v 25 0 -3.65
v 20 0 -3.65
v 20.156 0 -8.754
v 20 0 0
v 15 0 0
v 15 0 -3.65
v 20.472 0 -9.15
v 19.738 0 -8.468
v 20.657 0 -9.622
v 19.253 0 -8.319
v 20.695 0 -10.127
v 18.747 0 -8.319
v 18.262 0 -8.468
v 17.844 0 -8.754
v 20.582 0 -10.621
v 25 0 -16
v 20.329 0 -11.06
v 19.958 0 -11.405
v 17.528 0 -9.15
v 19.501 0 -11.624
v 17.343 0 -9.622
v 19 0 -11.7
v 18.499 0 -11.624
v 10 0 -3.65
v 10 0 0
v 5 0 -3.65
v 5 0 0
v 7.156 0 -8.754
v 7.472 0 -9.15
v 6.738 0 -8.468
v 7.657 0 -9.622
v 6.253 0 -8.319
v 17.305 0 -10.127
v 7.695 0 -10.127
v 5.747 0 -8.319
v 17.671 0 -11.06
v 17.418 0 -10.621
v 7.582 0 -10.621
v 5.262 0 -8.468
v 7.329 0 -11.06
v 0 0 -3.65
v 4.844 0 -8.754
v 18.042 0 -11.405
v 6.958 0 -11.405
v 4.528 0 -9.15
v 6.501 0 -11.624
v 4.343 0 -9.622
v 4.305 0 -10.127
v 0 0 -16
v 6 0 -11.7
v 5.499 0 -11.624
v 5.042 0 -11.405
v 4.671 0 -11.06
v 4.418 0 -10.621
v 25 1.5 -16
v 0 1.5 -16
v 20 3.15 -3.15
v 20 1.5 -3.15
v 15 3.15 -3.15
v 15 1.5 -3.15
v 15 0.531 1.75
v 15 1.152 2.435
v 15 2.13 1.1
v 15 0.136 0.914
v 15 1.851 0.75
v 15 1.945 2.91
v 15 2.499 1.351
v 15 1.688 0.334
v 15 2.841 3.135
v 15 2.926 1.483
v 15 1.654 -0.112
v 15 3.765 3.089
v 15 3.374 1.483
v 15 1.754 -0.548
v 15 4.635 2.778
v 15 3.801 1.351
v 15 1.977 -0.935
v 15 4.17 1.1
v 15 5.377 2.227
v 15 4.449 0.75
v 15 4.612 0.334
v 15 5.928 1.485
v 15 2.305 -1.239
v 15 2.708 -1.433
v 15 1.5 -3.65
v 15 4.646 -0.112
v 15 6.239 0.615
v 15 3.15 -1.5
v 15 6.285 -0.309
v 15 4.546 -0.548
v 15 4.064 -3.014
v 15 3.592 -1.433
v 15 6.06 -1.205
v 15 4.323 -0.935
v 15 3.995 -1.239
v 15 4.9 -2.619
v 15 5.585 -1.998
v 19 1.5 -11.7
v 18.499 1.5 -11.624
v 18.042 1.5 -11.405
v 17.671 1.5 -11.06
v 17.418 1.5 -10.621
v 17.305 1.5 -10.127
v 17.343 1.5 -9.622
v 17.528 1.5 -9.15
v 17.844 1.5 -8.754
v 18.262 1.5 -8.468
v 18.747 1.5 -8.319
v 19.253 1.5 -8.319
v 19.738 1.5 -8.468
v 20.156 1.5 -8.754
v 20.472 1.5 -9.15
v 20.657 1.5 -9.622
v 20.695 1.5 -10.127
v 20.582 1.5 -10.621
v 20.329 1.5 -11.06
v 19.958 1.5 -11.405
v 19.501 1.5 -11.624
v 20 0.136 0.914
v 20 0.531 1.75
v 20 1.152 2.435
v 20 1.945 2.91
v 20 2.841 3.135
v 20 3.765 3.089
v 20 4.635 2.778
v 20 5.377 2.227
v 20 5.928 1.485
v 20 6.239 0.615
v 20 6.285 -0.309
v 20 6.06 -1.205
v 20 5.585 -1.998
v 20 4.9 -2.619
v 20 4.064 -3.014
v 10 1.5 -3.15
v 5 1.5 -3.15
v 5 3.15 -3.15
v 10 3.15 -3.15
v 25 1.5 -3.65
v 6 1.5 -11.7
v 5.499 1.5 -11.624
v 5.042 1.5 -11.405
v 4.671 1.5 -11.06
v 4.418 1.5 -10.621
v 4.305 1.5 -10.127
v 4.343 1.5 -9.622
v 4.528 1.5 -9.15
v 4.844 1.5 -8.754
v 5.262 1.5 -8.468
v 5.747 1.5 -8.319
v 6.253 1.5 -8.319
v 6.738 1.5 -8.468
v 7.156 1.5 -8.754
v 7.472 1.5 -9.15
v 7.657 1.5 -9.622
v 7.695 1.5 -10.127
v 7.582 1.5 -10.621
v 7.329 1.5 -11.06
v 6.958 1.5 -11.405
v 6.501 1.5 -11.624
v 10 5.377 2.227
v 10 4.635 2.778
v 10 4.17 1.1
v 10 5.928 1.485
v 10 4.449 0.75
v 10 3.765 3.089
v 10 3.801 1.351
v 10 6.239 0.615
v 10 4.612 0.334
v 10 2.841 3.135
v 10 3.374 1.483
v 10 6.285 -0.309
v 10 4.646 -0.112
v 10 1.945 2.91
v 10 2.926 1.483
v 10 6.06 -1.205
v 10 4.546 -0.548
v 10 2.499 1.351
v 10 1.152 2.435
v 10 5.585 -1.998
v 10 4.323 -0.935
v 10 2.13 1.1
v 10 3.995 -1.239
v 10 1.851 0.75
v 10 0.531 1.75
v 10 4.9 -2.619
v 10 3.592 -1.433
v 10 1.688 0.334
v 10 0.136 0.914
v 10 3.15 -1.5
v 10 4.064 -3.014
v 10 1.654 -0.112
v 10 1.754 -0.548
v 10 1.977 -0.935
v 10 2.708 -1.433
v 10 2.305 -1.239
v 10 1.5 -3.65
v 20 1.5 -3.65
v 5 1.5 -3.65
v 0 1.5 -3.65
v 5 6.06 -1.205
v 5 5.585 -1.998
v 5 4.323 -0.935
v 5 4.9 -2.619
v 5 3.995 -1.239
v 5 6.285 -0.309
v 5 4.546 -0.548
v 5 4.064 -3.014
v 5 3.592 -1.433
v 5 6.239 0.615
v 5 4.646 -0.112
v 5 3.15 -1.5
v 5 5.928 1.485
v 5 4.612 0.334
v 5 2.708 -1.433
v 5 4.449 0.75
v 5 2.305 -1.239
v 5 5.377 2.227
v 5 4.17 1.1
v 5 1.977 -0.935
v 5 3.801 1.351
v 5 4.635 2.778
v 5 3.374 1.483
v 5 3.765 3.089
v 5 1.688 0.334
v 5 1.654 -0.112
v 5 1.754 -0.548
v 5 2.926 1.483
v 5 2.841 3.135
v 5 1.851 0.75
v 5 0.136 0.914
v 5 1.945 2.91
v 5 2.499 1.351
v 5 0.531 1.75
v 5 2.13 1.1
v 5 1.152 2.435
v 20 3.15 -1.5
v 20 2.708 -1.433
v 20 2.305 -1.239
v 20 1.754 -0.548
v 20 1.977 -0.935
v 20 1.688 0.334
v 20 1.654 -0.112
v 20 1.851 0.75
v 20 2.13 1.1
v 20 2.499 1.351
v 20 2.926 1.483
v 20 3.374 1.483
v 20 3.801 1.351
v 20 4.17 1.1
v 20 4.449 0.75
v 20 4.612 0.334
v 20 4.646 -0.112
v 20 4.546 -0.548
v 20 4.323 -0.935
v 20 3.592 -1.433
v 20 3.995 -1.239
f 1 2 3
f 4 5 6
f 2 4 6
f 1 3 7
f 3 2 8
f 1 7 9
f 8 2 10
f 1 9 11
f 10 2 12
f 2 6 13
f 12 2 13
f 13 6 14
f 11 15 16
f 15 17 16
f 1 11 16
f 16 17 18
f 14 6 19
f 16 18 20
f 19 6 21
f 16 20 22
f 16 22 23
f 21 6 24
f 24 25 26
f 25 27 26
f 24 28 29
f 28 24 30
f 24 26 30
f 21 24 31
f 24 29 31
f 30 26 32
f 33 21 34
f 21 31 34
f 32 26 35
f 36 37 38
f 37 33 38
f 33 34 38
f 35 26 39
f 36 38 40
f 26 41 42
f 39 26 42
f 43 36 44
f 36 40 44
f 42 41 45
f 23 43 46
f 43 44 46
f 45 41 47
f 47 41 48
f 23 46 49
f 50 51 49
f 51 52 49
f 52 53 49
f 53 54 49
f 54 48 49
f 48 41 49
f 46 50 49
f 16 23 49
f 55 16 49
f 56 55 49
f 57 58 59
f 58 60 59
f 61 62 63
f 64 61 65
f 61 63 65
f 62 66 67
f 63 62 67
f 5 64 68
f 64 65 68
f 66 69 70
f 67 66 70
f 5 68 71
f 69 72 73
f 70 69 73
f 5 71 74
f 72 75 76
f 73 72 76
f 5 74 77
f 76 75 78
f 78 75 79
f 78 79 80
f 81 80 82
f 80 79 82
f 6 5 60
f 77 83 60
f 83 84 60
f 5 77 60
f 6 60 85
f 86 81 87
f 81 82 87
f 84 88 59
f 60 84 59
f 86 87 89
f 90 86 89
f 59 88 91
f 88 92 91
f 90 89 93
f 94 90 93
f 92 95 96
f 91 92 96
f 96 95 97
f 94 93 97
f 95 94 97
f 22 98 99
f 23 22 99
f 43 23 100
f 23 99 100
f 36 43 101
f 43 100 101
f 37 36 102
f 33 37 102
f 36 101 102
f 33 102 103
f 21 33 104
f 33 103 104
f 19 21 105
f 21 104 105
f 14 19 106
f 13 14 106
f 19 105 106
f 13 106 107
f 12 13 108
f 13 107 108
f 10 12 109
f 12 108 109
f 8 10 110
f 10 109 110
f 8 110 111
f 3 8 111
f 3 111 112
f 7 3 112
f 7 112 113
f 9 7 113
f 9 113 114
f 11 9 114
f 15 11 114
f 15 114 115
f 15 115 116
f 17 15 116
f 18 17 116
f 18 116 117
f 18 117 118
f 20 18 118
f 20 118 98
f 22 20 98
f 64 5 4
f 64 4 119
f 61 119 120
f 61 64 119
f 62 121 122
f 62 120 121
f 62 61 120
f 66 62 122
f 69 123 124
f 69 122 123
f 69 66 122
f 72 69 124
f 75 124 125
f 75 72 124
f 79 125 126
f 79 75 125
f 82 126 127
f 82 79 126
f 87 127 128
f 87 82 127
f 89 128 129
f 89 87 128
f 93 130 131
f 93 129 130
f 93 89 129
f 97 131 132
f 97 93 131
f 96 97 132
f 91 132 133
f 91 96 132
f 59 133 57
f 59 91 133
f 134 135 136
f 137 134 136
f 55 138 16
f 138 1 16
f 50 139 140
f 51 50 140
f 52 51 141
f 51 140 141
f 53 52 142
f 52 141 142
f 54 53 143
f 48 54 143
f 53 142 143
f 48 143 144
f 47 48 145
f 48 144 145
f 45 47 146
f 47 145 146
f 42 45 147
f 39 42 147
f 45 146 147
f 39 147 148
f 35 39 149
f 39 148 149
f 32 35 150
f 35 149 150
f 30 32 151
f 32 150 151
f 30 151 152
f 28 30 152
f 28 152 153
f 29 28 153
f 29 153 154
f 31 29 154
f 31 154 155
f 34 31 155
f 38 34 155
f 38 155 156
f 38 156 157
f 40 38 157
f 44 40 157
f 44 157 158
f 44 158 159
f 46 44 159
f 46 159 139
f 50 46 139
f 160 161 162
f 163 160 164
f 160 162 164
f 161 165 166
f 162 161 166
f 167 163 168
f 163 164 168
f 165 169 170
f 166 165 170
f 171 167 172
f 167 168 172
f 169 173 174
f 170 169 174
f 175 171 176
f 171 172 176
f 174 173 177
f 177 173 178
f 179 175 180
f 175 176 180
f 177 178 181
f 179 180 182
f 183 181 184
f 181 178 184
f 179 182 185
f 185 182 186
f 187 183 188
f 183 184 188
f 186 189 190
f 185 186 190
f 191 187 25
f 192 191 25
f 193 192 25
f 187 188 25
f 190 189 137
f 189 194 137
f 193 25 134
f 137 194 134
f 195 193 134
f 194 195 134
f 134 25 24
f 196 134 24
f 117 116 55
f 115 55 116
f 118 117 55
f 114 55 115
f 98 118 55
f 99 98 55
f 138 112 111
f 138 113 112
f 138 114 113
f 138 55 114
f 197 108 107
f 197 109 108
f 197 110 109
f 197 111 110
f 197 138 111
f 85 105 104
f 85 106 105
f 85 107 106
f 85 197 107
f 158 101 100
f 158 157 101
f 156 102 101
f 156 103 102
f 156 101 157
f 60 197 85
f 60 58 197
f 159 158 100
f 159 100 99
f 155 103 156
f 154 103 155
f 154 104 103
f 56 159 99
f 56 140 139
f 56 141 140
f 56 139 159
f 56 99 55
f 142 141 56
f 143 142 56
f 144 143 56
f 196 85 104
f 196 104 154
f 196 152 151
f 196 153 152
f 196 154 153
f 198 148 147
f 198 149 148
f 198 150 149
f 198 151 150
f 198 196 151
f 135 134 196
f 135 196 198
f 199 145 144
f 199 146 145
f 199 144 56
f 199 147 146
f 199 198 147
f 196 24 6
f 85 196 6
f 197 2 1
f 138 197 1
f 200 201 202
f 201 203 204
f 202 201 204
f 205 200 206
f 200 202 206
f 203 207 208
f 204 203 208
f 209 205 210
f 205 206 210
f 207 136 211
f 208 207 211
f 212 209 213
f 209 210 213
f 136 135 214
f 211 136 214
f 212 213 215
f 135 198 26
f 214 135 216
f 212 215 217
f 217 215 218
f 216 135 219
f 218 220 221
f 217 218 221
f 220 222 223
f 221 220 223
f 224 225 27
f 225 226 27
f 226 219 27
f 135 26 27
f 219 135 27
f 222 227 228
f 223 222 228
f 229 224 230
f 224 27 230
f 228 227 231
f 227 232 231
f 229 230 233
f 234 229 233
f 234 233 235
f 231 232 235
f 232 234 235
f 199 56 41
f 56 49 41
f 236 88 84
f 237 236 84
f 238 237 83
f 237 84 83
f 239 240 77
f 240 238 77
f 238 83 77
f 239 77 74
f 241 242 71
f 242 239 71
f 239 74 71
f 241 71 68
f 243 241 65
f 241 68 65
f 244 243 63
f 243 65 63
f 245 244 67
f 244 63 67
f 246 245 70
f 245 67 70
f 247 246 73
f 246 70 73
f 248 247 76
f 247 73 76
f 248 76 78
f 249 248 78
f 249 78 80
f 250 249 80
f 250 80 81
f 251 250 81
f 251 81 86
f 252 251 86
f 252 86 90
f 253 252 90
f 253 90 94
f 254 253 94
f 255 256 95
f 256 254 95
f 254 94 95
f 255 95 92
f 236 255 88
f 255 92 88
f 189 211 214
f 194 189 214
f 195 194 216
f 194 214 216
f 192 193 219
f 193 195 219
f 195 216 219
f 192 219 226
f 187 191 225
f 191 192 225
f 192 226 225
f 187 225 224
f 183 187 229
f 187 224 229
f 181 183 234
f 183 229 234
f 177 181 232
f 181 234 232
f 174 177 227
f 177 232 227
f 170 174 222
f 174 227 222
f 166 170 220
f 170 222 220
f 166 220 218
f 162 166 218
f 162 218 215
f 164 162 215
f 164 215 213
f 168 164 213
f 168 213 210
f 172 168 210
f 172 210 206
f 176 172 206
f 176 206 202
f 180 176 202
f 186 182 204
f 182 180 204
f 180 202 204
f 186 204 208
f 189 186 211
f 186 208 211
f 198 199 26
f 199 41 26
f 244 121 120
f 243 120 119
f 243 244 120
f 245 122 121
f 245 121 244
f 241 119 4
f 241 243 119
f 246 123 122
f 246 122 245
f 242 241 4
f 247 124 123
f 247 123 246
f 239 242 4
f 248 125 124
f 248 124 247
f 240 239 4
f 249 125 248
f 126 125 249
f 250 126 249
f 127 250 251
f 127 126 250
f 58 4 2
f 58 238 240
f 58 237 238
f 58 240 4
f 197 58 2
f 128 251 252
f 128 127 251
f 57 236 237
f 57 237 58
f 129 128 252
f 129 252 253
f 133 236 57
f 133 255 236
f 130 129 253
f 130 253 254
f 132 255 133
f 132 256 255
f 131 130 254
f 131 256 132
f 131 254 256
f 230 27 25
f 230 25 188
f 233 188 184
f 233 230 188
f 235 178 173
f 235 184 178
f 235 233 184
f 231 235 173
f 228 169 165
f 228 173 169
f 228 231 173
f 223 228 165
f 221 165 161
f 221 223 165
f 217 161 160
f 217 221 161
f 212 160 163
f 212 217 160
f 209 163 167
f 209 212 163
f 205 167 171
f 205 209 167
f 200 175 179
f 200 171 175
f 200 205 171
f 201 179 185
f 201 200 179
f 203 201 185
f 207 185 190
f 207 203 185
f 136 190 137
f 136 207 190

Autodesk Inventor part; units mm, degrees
sketch "Sketch_10" plane through (0, 0, 0) normal (0, 1, 0) x (-1, 0, 0)
  line L0 (0, -3.65) -> (-5, -3.65)
  line L1 (-5, -3.65) -> (-5, -3.15)
  line L2 (-5, -3.15) -> (-10, -3.15)
  line L3 (-10, -3.15) -> (-10, -3.65)
  line L4 (-10, -3.65) -> (-15, -3.65)
  line L5 (-15, -3.65) -> (-15, -3.15)
  line L6 (-15, -3.15) -> (-20, -3.15)
  line L7 (-20, -3.15) -> (-20, -3.65)
  line L8 (-20, -3.65) -> (-25, -3.65)
  line L9 (-25, -3.65) -> (-25, -16)
  line L10 (-25, -16) -> (0, -16)
  line L11 (0, -16) -> (0, -3.65)
extrude "Extrusion1" add sketch "Sketch_10" along normal blind 1.5
sketch "Sketch_2" plane through (5, 0, 0) normal (1, 0, 0) x (0, 0, -1)
  arc A0 (3.15, 3.15) -> (0, 0) centre (0, 3.15) ccw
  line L0 (0, 0) -> (10.6667, 0)
  line L1 (10.6667, 0) -> (10.6667, 1.5)
  line L2 (10.6667, 1.5) -> (3.15, 1.5)
  line L3 (3.15, 1.5) -> (3.15, 3.15)
  circle A1 centre (0, 3.15) radius 1.5
extrude "Extrusion2" add sketch "Sketch_2" along normal blind 5
sketch "Sketch_3" plane through (15, 0, 0) normal (1, 0, 0) x (0, 0, -1)
  arc A0 (3.15, 3.15) -> (0, 0) centre (0, 3.15) ccw
  line L0 (0, 0) -> (10.6667, 0)
  line L1 (10.6667, 0) -> (10.6667, 1.5)
  line L2 (10.6667, 1.5) -> (3.15, 1.5)
  line L3 (3.15, 1.5) -> (3.15, 3.15)
  circle A1 centre (0, 3.15) radius 1.5
extrude "Extrusion3" add sketch "Sketch_3" along normal blind 5
sketch "Sketch4" plane through (0, 0, 0) normal (0, -1, 0) x (1, 0, 0)
  point P0 (6, -10)
hole "Hole1" at (6, 0, -10) direction (0, 1, 0) diameter 3.4 depth 2
sketch "Sketch5" plane through (0, 0, 0) normal (0, -1, 0) x (1, 0, 0)
  point P0 (19, -10)
hole "Hole2" at (19, 0, -10) direction (0, 1, 0) diameter 3.4 depth 2
ref_plane "1_XY" through (0, 3.15, 0) normal (1, 0, 0) x (0, 0, -1)
ref_plane "1_YZ" through (0, 3.15, 0) normal (0, 0, -1) x (0, 1, 0)
ref_plane "1_ZX" through (0, 3.15, 0) normal (0, 1, 0) x (1, 0, 0)
ref_plane "11_XY" through (0, 3.15, 0) normal (1, 0, 0) x (0, 0, -1)
ref_plane "11_YZ" through (0, 3.15, 0) normal (0, 0, -1) x (0, 1, 0)
ref_plane "11_ZX" through (0, 3.15, 0) normal (0, 1, 0) x (1, 0, 0)
properties part number "1HHKS25" material "ステンレス鋼"
